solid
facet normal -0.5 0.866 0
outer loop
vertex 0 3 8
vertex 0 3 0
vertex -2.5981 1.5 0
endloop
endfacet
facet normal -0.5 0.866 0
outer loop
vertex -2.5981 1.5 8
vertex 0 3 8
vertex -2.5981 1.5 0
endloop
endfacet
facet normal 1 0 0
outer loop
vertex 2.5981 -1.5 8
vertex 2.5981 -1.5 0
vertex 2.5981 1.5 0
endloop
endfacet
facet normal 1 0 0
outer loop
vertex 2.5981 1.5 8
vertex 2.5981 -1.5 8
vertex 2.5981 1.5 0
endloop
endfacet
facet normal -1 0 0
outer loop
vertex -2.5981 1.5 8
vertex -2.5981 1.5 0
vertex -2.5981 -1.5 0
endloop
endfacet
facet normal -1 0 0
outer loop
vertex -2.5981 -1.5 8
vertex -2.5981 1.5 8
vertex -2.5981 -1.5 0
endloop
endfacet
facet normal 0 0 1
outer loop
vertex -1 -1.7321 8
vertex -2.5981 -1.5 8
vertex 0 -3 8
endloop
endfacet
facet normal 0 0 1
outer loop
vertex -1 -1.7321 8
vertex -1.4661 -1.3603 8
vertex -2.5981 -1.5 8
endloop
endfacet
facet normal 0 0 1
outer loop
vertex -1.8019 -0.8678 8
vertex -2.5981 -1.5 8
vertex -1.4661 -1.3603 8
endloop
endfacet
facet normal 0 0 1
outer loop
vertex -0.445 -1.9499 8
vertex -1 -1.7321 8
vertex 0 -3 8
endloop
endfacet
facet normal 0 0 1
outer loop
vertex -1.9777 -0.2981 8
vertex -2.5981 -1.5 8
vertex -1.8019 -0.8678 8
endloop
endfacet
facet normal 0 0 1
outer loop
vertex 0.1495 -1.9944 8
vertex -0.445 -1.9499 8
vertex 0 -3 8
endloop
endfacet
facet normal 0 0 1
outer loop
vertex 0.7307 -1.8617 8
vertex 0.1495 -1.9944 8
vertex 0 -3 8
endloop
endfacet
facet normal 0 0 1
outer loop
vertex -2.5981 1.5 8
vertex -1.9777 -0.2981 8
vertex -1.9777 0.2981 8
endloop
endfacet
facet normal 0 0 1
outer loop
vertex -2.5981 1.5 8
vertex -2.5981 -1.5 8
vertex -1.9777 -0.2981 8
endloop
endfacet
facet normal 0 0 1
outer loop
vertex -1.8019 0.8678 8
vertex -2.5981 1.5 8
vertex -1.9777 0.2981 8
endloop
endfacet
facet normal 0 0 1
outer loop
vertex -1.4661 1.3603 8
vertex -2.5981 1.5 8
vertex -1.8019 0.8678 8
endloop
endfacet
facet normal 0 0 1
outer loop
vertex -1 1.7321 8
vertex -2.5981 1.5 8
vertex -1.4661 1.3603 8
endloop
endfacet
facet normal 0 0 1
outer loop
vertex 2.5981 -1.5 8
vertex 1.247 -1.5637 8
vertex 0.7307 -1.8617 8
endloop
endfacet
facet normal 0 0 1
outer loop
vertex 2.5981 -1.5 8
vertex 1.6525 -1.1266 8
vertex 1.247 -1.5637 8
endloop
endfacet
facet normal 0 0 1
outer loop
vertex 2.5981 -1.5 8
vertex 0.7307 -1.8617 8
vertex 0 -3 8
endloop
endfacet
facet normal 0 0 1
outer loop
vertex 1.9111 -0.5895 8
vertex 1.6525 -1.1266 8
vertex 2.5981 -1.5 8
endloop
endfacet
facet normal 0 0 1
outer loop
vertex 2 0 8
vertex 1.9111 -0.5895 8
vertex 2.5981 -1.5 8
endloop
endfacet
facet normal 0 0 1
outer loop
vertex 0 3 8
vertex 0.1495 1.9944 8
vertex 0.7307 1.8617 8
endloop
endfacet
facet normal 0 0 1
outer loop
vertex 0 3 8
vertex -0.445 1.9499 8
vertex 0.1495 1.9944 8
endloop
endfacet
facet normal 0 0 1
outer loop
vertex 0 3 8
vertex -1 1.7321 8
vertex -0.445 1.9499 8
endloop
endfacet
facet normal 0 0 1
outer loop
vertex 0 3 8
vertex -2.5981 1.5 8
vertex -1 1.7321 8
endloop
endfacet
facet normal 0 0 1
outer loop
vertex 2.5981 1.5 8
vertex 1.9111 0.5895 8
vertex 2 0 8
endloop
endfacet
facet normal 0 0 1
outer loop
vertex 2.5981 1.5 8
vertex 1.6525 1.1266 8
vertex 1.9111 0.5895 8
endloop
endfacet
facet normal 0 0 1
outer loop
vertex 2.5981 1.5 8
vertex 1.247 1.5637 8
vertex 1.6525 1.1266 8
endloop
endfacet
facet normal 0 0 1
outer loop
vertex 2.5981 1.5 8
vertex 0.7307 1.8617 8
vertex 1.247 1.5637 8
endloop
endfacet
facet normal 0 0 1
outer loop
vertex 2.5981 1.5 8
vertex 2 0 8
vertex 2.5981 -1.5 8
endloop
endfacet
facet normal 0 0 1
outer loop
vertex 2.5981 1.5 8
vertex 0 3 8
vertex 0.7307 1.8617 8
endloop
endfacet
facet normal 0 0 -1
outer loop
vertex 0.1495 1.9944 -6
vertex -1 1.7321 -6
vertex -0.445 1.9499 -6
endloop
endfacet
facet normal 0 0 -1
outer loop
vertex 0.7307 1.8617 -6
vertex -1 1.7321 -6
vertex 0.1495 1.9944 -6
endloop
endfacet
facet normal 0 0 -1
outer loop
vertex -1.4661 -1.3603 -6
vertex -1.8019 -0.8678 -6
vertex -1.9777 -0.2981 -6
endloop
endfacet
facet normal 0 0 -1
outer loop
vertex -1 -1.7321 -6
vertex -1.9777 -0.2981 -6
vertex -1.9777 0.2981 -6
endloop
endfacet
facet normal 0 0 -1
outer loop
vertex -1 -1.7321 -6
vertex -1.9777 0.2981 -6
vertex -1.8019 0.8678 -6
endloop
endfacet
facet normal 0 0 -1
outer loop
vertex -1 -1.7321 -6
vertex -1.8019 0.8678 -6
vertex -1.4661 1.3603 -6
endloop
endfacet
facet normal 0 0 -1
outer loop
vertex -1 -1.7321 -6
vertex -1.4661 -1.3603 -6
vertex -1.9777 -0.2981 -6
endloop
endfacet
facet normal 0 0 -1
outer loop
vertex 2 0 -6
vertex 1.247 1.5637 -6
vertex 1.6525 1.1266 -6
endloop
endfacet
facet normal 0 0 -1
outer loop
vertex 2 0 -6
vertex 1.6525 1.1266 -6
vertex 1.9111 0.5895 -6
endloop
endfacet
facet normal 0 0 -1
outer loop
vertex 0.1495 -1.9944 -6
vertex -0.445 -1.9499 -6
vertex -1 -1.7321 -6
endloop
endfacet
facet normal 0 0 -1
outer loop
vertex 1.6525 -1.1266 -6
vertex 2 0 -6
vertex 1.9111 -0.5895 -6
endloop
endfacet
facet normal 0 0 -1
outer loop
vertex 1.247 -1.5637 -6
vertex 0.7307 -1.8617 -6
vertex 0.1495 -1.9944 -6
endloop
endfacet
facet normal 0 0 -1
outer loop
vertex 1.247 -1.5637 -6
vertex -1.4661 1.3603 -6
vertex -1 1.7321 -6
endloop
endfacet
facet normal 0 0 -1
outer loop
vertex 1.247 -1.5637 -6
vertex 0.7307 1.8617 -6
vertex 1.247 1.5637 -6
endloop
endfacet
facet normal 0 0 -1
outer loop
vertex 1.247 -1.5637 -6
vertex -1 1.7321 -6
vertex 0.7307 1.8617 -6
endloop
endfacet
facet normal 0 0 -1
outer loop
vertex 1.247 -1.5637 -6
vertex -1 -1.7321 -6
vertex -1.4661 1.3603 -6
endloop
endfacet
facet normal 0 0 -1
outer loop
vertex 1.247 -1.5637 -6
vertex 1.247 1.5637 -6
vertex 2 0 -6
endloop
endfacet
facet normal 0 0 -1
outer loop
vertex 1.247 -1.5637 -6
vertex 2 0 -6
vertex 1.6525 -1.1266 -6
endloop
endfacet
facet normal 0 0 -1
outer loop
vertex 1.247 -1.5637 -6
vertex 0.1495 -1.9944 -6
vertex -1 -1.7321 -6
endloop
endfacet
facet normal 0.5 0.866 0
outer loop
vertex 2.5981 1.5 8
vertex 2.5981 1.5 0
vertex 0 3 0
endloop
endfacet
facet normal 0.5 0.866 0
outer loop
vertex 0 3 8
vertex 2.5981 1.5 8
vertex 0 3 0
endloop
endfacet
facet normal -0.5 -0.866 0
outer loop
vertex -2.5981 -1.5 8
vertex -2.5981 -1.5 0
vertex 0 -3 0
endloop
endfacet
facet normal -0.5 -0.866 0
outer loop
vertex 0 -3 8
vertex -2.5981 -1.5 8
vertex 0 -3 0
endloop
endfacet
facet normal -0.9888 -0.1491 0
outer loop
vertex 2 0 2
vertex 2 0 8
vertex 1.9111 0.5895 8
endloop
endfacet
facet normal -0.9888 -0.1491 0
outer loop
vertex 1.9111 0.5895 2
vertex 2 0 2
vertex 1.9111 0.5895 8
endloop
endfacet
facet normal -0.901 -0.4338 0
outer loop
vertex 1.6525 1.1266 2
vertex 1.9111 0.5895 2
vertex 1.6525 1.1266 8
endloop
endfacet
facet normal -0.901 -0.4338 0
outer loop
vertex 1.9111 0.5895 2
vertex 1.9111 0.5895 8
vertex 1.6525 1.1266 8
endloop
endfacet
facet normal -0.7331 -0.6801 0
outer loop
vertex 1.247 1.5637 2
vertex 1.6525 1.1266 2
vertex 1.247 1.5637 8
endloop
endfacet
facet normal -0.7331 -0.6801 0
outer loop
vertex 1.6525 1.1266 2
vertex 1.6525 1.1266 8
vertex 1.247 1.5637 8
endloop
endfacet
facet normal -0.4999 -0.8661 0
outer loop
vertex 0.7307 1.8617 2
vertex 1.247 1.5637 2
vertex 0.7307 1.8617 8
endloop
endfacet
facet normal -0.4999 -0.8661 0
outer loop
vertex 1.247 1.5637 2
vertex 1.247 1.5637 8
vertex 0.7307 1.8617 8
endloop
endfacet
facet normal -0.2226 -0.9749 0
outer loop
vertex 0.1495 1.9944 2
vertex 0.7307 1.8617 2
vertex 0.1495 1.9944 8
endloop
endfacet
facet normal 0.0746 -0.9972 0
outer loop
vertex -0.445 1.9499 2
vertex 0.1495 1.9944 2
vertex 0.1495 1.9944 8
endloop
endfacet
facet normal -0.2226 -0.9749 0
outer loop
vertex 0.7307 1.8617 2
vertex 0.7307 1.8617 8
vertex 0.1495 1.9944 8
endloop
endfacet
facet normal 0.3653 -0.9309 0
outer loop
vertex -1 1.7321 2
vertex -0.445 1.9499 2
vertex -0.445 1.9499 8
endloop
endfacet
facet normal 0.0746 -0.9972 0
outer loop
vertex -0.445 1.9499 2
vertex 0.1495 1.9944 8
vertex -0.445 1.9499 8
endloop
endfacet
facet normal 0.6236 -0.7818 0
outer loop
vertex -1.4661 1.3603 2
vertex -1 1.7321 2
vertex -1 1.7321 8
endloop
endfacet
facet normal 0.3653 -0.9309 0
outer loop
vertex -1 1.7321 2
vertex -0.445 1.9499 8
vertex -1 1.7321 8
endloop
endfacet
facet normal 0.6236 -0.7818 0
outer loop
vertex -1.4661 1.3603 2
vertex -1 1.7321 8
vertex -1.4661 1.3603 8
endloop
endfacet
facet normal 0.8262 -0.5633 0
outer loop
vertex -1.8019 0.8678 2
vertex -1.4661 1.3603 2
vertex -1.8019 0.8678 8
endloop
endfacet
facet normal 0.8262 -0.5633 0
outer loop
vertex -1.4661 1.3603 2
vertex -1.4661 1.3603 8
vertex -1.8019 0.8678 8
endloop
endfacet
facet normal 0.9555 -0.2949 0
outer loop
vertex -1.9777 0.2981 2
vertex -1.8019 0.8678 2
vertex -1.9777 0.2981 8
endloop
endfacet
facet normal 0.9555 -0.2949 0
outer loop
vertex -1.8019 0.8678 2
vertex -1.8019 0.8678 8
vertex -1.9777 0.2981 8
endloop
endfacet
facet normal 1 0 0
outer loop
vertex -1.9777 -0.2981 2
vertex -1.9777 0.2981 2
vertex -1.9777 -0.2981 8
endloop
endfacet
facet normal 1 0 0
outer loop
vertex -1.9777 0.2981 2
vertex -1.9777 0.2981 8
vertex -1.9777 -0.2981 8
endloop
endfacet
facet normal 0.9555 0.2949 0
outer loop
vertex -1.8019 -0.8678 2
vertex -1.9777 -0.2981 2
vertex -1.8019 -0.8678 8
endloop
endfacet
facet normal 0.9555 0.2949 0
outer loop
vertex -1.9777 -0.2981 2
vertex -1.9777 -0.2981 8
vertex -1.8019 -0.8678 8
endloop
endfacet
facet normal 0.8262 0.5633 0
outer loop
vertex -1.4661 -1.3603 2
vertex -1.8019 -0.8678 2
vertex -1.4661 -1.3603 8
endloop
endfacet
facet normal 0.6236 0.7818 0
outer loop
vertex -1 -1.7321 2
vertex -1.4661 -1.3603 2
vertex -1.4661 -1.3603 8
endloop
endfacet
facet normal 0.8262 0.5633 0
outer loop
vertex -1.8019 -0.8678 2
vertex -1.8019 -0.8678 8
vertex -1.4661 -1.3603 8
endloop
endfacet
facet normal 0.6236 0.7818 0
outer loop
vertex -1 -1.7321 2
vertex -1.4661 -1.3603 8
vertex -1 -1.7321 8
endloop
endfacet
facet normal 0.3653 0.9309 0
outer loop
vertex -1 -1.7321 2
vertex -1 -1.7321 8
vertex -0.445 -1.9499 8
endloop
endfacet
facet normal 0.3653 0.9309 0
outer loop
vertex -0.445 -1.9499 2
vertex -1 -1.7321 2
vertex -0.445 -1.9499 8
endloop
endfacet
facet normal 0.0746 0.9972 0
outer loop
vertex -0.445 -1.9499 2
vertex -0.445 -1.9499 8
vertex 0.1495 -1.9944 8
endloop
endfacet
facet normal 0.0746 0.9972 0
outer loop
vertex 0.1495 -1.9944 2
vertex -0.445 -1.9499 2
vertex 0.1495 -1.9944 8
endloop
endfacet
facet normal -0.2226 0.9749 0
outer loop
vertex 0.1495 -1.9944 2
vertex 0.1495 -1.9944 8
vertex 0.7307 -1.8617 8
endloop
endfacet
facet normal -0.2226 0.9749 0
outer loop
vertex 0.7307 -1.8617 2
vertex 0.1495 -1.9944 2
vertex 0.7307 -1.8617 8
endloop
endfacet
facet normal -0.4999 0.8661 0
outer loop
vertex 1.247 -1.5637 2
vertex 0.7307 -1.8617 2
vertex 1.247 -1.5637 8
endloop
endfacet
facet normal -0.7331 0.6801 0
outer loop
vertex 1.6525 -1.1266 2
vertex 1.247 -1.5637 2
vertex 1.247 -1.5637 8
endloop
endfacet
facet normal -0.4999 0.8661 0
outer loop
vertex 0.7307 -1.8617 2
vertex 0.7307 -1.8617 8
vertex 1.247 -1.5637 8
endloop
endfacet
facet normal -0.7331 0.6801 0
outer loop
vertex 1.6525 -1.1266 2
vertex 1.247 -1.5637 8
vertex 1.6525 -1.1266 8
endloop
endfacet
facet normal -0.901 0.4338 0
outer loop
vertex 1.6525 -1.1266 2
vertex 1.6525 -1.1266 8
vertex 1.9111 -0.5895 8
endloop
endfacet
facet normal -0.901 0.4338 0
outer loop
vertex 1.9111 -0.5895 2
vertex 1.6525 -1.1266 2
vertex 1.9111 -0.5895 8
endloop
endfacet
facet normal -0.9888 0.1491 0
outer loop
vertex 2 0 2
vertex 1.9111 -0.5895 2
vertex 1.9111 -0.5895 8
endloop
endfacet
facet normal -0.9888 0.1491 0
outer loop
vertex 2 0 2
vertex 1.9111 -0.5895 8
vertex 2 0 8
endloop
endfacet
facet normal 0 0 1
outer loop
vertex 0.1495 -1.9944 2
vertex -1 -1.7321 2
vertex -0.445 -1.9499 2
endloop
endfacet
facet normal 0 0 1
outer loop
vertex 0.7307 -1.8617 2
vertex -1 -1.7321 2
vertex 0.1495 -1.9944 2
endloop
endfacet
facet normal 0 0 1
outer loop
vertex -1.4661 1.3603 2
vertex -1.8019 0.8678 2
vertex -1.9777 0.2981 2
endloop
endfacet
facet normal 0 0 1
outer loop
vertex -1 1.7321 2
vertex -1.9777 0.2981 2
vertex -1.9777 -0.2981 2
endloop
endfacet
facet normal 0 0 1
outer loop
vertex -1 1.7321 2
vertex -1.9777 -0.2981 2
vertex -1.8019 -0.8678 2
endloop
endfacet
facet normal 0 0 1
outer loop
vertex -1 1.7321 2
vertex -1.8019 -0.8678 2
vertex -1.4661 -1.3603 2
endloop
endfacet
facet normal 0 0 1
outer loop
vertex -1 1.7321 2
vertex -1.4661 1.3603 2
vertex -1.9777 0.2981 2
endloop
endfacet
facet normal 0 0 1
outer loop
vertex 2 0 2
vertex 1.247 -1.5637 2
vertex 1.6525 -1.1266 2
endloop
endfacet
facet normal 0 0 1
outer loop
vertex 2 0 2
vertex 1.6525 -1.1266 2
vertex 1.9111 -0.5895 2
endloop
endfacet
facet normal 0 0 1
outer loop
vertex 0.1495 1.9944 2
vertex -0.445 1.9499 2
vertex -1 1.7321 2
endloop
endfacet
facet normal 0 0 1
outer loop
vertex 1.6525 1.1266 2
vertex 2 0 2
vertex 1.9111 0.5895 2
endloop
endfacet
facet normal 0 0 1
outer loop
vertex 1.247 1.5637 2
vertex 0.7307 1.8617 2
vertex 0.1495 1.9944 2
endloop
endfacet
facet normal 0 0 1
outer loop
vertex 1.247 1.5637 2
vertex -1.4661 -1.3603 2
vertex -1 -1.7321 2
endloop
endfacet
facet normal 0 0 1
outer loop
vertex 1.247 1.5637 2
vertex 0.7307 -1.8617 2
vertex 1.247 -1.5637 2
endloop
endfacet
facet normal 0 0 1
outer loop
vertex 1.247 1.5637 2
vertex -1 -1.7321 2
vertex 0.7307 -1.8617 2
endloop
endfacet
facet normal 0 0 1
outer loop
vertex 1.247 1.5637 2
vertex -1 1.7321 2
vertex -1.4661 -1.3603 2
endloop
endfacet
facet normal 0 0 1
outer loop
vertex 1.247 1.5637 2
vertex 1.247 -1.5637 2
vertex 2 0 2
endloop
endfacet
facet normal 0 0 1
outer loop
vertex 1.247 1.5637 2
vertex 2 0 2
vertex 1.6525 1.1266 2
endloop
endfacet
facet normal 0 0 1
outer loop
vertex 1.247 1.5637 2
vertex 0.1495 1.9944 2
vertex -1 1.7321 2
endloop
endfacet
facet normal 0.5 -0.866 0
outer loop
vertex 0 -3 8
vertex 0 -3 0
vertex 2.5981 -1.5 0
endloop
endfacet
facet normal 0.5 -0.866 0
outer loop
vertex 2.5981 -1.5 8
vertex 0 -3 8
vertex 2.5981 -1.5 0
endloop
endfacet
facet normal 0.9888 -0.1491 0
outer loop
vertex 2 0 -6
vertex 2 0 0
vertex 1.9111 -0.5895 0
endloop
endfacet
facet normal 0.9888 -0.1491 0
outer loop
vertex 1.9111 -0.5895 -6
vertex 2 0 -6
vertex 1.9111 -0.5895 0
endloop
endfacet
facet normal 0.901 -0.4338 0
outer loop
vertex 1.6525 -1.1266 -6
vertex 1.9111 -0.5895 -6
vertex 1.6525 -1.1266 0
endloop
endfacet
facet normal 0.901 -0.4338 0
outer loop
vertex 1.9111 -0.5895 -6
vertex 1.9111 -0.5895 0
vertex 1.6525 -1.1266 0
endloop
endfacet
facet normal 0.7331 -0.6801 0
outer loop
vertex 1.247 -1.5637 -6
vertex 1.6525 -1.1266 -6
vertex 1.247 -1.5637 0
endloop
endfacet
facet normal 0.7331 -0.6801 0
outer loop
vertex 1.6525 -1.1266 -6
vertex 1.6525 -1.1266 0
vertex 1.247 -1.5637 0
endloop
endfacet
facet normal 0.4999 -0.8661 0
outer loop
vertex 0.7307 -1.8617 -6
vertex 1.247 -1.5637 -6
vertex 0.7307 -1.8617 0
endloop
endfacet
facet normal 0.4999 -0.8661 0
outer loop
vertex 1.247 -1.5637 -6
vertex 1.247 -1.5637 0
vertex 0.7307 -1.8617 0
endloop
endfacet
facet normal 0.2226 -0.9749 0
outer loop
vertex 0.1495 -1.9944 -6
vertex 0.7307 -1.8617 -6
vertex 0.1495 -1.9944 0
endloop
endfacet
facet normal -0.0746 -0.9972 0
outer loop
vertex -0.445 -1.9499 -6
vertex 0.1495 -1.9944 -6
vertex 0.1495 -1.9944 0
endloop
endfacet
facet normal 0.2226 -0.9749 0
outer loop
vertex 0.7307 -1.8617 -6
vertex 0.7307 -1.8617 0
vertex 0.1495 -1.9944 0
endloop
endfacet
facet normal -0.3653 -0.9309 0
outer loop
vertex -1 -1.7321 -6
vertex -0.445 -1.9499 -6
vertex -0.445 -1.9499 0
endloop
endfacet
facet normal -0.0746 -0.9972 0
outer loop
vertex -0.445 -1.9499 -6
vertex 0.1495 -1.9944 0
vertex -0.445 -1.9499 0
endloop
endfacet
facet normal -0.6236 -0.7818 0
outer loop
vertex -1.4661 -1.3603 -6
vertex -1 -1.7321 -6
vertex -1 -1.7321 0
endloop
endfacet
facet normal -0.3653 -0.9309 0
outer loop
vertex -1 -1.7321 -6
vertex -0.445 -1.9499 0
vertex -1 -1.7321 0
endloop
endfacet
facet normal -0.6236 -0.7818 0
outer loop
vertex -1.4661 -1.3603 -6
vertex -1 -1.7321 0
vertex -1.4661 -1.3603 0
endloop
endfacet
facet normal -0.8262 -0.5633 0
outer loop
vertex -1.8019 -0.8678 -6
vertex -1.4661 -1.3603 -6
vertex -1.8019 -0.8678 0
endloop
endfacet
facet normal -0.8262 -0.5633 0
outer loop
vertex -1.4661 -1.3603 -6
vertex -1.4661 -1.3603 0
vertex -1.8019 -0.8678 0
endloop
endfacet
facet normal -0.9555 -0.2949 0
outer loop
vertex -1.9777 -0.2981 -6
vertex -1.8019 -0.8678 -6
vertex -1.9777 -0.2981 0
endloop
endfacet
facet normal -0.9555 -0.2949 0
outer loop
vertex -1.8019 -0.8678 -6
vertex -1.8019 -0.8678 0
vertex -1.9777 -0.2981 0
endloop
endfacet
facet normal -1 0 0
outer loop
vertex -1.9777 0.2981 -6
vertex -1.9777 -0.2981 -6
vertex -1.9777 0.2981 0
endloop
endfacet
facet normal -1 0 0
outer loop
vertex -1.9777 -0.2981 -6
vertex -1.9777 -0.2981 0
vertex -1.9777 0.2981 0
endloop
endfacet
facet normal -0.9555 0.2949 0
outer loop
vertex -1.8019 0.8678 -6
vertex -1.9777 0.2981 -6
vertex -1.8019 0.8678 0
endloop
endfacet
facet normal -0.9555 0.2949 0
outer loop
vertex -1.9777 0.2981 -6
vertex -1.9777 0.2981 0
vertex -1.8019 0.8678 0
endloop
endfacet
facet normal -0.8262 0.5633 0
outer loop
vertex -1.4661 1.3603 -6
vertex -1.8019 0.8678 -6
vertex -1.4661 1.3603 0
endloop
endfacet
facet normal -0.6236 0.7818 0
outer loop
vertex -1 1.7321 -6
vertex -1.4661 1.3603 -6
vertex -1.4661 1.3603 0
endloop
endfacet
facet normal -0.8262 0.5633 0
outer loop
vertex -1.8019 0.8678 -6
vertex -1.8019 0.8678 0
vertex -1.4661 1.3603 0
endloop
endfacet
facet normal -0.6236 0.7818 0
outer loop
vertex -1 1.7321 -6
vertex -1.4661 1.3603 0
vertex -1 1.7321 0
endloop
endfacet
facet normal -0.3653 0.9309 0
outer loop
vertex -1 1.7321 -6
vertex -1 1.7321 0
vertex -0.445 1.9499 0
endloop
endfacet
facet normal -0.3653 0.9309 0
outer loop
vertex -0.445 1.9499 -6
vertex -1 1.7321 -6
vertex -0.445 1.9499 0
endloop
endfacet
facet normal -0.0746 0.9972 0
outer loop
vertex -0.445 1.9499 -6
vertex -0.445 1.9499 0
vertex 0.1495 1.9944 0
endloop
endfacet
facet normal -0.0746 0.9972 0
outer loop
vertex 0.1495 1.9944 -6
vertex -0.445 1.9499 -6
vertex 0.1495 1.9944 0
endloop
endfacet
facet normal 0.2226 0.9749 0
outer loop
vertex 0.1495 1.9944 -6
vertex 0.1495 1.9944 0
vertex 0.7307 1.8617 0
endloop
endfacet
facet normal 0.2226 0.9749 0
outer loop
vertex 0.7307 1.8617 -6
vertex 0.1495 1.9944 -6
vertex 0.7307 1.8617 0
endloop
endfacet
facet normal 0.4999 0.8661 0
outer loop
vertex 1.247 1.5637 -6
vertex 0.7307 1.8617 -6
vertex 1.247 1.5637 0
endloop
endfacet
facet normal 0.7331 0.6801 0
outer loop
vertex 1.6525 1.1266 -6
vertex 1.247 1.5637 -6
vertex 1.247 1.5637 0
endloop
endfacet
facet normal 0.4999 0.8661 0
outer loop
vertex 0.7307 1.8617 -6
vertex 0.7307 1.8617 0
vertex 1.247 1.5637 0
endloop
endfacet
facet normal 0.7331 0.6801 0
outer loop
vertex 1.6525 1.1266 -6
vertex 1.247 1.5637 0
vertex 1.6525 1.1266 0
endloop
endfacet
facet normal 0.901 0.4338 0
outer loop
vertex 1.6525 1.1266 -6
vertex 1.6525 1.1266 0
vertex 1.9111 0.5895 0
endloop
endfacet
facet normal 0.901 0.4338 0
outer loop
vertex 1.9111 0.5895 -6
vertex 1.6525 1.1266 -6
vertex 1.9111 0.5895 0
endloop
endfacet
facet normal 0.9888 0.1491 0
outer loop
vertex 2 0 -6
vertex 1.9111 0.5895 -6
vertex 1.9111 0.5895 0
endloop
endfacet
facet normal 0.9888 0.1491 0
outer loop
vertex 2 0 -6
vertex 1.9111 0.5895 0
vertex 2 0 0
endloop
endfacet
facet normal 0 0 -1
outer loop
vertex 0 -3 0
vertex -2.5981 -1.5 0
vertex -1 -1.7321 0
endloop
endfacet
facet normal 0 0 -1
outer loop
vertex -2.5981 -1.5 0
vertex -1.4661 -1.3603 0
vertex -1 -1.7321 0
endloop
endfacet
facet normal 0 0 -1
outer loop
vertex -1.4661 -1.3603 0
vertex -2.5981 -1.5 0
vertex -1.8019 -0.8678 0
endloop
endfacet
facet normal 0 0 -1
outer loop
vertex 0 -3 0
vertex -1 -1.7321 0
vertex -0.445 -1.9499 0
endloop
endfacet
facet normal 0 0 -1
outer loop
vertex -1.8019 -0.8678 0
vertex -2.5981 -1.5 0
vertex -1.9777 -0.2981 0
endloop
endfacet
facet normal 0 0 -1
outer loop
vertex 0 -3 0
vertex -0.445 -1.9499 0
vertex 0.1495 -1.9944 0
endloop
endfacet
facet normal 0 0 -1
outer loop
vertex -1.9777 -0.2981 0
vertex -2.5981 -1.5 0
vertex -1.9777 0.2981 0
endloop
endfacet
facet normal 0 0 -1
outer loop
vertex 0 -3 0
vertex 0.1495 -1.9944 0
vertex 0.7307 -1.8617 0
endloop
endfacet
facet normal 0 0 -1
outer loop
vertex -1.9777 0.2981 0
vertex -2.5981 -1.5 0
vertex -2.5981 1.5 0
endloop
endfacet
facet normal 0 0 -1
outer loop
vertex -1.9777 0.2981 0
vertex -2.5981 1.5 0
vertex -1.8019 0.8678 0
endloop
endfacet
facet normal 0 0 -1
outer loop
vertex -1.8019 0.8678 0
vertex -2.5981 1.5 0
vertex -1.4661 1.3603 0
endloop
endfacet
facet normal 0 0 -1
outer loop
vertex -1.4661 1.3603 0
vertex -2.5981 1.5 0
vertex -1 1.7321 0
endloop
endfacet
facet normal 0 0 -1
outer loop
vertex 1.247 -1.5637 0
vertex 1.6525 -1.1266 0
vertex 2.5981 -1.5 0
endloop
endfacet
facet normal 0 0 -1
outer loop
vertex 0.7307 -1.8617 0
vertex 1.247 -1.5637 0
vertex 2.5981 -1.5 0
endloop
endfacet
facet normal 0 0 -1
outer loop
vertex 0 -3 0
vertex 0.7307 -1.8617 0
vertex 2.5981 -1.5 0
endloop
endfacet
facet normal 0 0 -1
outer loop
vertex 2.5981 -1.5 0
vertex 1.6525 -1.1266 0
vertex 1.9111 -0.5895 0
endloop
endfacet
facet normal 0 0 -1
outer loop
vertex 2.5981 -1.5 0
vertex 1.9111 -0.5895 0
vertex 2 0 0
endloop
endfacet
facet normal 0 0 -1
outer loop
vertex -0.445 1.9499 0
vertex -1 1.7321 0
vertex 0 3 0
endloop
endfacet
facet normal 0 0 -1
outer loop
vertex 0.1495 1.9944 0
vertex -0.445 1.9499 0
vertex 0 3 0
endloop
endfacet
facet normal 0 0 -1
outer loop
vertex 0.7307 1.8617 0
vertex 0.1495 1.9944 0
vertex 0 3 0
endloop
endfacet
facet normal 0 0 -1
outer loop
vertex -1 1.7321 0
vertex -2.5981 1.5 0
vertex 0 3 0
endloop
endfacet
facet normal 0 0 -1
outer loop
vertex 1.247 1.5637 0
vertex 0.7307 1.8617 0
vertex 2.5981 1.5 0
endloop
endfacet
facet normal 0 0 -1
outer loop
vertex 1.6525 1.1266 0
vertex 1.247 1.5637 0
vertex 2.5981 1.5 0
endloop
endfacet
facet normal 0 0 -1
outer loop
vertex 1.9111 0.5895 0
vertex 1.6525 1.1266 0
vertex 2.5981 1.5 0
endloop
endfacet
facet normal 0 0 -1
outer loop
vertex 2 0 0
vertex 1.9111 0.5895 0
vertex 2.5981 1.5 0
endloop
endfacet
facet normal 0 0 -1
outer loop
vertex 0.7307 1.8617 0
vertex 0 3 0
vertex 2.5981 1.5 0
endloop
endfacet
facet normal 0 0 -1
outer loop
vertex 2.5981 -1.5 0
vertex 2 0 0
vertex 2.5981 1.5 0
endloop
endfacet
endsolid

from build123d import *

# Parameters (mm, degrees)
EXTRUDE_1_DEPTH     = 8
SKETCH_2_R          = 2
CUT_EXTRUDE_1_DEPTH = 6
SKETCH_3_R          = 2
EXTRUDE_2_DEPTH     = 6


with BuildPart() as part:
    # 草图1 → 凸台-拉伸1 (new body)
    with BuildSketch(Plane.XY):
        Polygon((0, 3), (-2.598076211, 1.5), (-2.598076211, -1.5), (0, -3), (2.598076211, -1.5), (2.598076211, 1.5), align=None)
    extrude(amount=EXTRUDE_1_DEPTH)

    # 草图2 → 切除-拉伸1 (cut)
    with BuildSketch(Plane.XY.offset(8)):
        Circle(SKETCH_2_R)
    extrude(amount=-CUT_EXTRUDE_1_DEPTH, mode=Mode.SUBTRACT)

    # 草图3 → 凸台-拉伸2 (add)
    with BuildSketch(Plane(origin=(0, 0, 0), x_dir=(-1, 0, 0), z_dir=(0, 0, -1))):
        with Locations(Location((0, 0, 0), (0, 0, 180))):
            Circle(SKETCH_3_R)
    extrude(amount=EXTRUDE_2_DEPTH)


solid = part.part
